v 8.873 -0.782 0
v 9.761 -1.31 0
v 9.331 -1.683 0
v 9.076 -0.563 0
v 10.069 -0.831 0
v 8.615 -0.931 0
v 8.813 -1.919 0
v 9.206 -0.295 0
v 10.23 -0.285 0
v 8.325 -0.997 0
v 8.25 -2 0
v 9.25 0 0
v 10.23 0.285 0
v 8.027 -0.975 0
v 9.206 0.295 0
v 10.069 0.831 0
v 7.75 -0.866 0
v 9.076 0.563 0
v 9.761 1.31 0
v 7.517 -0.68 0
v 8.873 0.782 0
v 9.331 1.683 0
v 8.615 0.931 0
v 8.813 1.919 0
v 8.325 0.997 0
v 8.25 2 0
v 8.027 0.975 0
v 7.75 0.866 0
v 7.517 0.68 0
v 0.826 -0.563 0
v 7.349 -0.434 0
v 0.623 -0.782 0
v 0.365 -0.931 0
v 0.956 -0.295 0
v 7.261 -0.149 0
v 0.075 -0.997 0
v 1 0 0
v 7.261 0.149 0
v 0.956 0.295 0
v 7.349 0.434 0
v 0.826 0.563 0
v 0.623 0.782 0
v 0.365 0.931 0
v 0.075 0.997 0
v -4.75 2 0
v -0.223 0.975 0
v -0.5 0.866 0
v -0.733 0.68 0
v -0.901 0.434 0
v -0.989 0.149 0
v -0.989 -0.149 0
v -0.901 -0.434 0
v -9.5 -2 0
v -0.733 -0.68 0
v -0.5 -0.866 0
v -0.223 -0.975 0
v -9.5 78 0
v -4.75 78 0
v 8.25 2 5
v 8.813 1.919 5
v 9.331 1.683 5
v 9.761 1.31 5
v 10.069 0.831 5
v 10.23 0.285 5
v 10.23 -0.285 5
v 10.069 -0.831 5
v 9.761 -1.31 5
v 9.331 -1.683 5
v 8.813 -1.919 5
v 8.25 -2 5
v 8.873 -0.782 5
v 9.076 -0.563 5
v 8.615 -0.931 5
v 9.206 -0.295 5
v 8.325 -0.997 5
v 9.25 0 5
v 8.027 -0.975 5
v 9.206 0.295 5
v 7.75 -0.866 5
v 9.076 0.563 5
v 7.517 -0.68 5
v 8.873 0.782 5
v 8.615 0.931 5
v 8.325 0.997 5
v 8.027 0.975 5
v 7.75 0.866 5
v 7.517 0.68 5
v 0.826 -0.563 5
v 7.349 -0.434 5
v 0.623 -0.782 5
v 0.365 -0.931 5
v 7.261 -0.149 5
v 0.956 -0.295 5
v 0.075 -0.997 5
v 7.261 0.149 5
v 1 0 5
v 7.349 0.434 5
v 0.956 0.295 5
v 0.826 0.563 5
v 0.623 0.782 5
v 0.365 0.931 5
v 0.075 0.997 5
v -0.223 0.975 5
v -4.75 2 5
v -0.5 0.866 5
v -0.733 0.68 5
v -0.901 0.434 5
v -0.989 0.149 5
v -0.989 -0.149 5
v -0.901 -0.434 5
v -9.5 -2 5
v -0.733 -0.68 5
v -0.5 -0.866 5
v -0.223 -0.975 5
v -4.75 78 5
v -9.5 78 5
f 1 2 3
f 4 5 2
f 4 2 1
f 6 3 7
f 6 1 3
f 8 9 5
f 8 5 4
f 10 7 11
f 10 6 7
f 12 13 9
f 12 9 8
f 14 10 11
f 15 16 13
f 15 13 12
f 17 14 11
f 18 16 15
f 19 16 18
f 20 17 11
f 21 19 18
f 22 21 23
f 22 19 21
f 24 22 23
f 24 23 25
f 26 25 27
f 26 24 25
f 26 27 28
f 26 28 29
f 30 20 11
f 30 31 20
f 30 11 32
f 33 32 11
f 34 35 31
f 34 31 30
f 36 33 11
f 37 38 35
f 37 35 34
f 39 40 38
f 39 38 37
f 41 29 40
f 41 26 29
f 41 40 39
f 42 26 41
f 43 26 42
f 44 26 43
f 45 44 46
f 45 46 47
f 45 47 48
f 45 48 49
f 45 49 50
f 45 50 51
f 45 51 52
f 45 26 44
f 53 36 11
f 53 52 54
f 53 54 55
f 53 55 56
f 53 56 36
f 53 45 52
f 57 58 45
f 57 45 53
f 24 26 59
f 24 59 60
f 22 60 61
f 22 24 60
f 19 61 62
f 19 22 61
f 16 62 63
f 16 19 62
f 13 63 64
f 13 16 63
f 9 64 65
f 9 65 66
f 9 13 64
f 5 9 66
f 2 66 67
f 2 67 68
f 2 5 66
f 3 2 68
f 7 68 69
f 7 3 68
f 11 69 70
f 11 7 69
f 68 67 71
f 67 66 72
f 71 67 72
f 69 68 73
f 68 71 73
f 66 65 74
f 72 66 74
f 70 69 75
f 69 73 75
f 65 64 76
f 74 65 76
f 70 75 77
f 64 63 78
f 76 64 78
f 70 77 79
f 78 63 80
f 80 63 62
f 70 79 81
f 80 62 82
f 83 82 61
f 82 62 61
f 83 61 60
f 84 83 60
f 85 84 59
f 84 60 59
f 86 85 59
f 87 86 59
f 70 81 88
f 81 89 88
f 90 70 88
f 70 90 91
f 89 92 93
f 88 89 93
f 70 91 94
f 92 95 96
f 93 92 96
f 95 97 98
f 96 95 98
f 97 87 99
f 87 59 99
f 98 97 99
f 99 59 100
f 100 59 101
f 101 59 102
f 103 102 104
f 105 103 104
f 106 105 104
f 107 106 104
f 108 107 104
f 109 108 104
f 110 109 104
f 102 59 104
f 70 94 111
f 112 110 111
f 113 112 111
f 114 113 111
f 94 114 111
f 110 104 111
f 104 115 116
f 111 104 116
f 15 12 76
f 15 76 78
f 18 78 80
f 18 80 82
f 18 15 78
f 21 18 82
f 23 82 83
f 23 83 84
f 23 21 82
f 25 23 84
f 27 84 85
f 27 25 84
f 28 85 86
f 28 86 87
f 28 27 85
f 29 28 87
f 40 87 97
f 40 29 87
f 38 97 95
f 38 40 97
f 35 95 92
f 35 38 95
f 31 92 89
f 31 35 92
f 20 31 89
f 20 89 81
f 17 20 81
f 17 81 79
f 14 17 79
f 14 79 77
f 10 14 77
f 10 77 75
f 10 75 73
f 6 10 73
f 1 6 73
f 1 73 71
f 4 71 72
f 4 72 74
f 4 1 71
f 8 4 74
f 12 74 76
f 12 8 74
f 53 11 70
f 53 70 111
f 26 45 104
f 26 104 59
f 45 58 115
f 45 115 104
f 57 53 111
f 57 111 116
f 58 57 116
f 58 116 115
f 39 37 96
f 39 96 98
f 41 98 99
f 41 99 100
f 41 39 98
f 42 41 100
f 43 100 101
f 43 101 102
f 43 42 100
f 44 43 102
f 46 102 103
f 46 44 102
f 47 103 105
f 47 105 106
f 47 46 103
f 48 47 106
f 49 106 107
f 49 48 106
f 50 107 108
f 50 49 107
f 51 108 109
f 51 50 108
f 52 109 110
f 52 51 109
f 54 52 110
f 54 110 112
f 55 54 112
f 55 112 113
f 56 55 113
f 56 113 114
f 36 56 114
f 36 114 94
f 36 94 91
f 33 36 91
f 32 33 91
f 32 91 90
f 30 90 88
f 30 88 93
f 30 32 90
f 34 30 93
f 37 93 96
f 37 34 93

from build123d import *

# Parameters (mm, degrees)
SKETCH_1_R      = 1
EXTRUDE_1_DEPTH = 5


with BuildPart() as part:
    # 草图1 → 凸台-拉伸1 (new body)
    with BuildSketch(Plane.XY):
        with BuildLine():
            Line((0, 2), (8.25, 2))
            ThreePointArc((8.25, 2), (10.25, 0), (8.25, -2))
            Line((8.25, -2), (-0.5, -2))
            Line((-0.5, -2), (-9.5, -2))
            Line((-9.5, -2), (-9.5, 78))
            Line((-9.5, 78), (-4.75, 78))
            Line((-4.75, 78), (-4.75, 2))
            Line((-4.75, 2), (0, 2))
        make_face()
        Circle(SKETCH_1_R, mode=Mode.SUBTRACT)
        with Locations((8.25, 0)):
            Circle(SKETCH_1_R, mode=Mode.SUBTRACT)
    extrude(amount=EXTRUDE_1_DEPTH)


solid = part.part
